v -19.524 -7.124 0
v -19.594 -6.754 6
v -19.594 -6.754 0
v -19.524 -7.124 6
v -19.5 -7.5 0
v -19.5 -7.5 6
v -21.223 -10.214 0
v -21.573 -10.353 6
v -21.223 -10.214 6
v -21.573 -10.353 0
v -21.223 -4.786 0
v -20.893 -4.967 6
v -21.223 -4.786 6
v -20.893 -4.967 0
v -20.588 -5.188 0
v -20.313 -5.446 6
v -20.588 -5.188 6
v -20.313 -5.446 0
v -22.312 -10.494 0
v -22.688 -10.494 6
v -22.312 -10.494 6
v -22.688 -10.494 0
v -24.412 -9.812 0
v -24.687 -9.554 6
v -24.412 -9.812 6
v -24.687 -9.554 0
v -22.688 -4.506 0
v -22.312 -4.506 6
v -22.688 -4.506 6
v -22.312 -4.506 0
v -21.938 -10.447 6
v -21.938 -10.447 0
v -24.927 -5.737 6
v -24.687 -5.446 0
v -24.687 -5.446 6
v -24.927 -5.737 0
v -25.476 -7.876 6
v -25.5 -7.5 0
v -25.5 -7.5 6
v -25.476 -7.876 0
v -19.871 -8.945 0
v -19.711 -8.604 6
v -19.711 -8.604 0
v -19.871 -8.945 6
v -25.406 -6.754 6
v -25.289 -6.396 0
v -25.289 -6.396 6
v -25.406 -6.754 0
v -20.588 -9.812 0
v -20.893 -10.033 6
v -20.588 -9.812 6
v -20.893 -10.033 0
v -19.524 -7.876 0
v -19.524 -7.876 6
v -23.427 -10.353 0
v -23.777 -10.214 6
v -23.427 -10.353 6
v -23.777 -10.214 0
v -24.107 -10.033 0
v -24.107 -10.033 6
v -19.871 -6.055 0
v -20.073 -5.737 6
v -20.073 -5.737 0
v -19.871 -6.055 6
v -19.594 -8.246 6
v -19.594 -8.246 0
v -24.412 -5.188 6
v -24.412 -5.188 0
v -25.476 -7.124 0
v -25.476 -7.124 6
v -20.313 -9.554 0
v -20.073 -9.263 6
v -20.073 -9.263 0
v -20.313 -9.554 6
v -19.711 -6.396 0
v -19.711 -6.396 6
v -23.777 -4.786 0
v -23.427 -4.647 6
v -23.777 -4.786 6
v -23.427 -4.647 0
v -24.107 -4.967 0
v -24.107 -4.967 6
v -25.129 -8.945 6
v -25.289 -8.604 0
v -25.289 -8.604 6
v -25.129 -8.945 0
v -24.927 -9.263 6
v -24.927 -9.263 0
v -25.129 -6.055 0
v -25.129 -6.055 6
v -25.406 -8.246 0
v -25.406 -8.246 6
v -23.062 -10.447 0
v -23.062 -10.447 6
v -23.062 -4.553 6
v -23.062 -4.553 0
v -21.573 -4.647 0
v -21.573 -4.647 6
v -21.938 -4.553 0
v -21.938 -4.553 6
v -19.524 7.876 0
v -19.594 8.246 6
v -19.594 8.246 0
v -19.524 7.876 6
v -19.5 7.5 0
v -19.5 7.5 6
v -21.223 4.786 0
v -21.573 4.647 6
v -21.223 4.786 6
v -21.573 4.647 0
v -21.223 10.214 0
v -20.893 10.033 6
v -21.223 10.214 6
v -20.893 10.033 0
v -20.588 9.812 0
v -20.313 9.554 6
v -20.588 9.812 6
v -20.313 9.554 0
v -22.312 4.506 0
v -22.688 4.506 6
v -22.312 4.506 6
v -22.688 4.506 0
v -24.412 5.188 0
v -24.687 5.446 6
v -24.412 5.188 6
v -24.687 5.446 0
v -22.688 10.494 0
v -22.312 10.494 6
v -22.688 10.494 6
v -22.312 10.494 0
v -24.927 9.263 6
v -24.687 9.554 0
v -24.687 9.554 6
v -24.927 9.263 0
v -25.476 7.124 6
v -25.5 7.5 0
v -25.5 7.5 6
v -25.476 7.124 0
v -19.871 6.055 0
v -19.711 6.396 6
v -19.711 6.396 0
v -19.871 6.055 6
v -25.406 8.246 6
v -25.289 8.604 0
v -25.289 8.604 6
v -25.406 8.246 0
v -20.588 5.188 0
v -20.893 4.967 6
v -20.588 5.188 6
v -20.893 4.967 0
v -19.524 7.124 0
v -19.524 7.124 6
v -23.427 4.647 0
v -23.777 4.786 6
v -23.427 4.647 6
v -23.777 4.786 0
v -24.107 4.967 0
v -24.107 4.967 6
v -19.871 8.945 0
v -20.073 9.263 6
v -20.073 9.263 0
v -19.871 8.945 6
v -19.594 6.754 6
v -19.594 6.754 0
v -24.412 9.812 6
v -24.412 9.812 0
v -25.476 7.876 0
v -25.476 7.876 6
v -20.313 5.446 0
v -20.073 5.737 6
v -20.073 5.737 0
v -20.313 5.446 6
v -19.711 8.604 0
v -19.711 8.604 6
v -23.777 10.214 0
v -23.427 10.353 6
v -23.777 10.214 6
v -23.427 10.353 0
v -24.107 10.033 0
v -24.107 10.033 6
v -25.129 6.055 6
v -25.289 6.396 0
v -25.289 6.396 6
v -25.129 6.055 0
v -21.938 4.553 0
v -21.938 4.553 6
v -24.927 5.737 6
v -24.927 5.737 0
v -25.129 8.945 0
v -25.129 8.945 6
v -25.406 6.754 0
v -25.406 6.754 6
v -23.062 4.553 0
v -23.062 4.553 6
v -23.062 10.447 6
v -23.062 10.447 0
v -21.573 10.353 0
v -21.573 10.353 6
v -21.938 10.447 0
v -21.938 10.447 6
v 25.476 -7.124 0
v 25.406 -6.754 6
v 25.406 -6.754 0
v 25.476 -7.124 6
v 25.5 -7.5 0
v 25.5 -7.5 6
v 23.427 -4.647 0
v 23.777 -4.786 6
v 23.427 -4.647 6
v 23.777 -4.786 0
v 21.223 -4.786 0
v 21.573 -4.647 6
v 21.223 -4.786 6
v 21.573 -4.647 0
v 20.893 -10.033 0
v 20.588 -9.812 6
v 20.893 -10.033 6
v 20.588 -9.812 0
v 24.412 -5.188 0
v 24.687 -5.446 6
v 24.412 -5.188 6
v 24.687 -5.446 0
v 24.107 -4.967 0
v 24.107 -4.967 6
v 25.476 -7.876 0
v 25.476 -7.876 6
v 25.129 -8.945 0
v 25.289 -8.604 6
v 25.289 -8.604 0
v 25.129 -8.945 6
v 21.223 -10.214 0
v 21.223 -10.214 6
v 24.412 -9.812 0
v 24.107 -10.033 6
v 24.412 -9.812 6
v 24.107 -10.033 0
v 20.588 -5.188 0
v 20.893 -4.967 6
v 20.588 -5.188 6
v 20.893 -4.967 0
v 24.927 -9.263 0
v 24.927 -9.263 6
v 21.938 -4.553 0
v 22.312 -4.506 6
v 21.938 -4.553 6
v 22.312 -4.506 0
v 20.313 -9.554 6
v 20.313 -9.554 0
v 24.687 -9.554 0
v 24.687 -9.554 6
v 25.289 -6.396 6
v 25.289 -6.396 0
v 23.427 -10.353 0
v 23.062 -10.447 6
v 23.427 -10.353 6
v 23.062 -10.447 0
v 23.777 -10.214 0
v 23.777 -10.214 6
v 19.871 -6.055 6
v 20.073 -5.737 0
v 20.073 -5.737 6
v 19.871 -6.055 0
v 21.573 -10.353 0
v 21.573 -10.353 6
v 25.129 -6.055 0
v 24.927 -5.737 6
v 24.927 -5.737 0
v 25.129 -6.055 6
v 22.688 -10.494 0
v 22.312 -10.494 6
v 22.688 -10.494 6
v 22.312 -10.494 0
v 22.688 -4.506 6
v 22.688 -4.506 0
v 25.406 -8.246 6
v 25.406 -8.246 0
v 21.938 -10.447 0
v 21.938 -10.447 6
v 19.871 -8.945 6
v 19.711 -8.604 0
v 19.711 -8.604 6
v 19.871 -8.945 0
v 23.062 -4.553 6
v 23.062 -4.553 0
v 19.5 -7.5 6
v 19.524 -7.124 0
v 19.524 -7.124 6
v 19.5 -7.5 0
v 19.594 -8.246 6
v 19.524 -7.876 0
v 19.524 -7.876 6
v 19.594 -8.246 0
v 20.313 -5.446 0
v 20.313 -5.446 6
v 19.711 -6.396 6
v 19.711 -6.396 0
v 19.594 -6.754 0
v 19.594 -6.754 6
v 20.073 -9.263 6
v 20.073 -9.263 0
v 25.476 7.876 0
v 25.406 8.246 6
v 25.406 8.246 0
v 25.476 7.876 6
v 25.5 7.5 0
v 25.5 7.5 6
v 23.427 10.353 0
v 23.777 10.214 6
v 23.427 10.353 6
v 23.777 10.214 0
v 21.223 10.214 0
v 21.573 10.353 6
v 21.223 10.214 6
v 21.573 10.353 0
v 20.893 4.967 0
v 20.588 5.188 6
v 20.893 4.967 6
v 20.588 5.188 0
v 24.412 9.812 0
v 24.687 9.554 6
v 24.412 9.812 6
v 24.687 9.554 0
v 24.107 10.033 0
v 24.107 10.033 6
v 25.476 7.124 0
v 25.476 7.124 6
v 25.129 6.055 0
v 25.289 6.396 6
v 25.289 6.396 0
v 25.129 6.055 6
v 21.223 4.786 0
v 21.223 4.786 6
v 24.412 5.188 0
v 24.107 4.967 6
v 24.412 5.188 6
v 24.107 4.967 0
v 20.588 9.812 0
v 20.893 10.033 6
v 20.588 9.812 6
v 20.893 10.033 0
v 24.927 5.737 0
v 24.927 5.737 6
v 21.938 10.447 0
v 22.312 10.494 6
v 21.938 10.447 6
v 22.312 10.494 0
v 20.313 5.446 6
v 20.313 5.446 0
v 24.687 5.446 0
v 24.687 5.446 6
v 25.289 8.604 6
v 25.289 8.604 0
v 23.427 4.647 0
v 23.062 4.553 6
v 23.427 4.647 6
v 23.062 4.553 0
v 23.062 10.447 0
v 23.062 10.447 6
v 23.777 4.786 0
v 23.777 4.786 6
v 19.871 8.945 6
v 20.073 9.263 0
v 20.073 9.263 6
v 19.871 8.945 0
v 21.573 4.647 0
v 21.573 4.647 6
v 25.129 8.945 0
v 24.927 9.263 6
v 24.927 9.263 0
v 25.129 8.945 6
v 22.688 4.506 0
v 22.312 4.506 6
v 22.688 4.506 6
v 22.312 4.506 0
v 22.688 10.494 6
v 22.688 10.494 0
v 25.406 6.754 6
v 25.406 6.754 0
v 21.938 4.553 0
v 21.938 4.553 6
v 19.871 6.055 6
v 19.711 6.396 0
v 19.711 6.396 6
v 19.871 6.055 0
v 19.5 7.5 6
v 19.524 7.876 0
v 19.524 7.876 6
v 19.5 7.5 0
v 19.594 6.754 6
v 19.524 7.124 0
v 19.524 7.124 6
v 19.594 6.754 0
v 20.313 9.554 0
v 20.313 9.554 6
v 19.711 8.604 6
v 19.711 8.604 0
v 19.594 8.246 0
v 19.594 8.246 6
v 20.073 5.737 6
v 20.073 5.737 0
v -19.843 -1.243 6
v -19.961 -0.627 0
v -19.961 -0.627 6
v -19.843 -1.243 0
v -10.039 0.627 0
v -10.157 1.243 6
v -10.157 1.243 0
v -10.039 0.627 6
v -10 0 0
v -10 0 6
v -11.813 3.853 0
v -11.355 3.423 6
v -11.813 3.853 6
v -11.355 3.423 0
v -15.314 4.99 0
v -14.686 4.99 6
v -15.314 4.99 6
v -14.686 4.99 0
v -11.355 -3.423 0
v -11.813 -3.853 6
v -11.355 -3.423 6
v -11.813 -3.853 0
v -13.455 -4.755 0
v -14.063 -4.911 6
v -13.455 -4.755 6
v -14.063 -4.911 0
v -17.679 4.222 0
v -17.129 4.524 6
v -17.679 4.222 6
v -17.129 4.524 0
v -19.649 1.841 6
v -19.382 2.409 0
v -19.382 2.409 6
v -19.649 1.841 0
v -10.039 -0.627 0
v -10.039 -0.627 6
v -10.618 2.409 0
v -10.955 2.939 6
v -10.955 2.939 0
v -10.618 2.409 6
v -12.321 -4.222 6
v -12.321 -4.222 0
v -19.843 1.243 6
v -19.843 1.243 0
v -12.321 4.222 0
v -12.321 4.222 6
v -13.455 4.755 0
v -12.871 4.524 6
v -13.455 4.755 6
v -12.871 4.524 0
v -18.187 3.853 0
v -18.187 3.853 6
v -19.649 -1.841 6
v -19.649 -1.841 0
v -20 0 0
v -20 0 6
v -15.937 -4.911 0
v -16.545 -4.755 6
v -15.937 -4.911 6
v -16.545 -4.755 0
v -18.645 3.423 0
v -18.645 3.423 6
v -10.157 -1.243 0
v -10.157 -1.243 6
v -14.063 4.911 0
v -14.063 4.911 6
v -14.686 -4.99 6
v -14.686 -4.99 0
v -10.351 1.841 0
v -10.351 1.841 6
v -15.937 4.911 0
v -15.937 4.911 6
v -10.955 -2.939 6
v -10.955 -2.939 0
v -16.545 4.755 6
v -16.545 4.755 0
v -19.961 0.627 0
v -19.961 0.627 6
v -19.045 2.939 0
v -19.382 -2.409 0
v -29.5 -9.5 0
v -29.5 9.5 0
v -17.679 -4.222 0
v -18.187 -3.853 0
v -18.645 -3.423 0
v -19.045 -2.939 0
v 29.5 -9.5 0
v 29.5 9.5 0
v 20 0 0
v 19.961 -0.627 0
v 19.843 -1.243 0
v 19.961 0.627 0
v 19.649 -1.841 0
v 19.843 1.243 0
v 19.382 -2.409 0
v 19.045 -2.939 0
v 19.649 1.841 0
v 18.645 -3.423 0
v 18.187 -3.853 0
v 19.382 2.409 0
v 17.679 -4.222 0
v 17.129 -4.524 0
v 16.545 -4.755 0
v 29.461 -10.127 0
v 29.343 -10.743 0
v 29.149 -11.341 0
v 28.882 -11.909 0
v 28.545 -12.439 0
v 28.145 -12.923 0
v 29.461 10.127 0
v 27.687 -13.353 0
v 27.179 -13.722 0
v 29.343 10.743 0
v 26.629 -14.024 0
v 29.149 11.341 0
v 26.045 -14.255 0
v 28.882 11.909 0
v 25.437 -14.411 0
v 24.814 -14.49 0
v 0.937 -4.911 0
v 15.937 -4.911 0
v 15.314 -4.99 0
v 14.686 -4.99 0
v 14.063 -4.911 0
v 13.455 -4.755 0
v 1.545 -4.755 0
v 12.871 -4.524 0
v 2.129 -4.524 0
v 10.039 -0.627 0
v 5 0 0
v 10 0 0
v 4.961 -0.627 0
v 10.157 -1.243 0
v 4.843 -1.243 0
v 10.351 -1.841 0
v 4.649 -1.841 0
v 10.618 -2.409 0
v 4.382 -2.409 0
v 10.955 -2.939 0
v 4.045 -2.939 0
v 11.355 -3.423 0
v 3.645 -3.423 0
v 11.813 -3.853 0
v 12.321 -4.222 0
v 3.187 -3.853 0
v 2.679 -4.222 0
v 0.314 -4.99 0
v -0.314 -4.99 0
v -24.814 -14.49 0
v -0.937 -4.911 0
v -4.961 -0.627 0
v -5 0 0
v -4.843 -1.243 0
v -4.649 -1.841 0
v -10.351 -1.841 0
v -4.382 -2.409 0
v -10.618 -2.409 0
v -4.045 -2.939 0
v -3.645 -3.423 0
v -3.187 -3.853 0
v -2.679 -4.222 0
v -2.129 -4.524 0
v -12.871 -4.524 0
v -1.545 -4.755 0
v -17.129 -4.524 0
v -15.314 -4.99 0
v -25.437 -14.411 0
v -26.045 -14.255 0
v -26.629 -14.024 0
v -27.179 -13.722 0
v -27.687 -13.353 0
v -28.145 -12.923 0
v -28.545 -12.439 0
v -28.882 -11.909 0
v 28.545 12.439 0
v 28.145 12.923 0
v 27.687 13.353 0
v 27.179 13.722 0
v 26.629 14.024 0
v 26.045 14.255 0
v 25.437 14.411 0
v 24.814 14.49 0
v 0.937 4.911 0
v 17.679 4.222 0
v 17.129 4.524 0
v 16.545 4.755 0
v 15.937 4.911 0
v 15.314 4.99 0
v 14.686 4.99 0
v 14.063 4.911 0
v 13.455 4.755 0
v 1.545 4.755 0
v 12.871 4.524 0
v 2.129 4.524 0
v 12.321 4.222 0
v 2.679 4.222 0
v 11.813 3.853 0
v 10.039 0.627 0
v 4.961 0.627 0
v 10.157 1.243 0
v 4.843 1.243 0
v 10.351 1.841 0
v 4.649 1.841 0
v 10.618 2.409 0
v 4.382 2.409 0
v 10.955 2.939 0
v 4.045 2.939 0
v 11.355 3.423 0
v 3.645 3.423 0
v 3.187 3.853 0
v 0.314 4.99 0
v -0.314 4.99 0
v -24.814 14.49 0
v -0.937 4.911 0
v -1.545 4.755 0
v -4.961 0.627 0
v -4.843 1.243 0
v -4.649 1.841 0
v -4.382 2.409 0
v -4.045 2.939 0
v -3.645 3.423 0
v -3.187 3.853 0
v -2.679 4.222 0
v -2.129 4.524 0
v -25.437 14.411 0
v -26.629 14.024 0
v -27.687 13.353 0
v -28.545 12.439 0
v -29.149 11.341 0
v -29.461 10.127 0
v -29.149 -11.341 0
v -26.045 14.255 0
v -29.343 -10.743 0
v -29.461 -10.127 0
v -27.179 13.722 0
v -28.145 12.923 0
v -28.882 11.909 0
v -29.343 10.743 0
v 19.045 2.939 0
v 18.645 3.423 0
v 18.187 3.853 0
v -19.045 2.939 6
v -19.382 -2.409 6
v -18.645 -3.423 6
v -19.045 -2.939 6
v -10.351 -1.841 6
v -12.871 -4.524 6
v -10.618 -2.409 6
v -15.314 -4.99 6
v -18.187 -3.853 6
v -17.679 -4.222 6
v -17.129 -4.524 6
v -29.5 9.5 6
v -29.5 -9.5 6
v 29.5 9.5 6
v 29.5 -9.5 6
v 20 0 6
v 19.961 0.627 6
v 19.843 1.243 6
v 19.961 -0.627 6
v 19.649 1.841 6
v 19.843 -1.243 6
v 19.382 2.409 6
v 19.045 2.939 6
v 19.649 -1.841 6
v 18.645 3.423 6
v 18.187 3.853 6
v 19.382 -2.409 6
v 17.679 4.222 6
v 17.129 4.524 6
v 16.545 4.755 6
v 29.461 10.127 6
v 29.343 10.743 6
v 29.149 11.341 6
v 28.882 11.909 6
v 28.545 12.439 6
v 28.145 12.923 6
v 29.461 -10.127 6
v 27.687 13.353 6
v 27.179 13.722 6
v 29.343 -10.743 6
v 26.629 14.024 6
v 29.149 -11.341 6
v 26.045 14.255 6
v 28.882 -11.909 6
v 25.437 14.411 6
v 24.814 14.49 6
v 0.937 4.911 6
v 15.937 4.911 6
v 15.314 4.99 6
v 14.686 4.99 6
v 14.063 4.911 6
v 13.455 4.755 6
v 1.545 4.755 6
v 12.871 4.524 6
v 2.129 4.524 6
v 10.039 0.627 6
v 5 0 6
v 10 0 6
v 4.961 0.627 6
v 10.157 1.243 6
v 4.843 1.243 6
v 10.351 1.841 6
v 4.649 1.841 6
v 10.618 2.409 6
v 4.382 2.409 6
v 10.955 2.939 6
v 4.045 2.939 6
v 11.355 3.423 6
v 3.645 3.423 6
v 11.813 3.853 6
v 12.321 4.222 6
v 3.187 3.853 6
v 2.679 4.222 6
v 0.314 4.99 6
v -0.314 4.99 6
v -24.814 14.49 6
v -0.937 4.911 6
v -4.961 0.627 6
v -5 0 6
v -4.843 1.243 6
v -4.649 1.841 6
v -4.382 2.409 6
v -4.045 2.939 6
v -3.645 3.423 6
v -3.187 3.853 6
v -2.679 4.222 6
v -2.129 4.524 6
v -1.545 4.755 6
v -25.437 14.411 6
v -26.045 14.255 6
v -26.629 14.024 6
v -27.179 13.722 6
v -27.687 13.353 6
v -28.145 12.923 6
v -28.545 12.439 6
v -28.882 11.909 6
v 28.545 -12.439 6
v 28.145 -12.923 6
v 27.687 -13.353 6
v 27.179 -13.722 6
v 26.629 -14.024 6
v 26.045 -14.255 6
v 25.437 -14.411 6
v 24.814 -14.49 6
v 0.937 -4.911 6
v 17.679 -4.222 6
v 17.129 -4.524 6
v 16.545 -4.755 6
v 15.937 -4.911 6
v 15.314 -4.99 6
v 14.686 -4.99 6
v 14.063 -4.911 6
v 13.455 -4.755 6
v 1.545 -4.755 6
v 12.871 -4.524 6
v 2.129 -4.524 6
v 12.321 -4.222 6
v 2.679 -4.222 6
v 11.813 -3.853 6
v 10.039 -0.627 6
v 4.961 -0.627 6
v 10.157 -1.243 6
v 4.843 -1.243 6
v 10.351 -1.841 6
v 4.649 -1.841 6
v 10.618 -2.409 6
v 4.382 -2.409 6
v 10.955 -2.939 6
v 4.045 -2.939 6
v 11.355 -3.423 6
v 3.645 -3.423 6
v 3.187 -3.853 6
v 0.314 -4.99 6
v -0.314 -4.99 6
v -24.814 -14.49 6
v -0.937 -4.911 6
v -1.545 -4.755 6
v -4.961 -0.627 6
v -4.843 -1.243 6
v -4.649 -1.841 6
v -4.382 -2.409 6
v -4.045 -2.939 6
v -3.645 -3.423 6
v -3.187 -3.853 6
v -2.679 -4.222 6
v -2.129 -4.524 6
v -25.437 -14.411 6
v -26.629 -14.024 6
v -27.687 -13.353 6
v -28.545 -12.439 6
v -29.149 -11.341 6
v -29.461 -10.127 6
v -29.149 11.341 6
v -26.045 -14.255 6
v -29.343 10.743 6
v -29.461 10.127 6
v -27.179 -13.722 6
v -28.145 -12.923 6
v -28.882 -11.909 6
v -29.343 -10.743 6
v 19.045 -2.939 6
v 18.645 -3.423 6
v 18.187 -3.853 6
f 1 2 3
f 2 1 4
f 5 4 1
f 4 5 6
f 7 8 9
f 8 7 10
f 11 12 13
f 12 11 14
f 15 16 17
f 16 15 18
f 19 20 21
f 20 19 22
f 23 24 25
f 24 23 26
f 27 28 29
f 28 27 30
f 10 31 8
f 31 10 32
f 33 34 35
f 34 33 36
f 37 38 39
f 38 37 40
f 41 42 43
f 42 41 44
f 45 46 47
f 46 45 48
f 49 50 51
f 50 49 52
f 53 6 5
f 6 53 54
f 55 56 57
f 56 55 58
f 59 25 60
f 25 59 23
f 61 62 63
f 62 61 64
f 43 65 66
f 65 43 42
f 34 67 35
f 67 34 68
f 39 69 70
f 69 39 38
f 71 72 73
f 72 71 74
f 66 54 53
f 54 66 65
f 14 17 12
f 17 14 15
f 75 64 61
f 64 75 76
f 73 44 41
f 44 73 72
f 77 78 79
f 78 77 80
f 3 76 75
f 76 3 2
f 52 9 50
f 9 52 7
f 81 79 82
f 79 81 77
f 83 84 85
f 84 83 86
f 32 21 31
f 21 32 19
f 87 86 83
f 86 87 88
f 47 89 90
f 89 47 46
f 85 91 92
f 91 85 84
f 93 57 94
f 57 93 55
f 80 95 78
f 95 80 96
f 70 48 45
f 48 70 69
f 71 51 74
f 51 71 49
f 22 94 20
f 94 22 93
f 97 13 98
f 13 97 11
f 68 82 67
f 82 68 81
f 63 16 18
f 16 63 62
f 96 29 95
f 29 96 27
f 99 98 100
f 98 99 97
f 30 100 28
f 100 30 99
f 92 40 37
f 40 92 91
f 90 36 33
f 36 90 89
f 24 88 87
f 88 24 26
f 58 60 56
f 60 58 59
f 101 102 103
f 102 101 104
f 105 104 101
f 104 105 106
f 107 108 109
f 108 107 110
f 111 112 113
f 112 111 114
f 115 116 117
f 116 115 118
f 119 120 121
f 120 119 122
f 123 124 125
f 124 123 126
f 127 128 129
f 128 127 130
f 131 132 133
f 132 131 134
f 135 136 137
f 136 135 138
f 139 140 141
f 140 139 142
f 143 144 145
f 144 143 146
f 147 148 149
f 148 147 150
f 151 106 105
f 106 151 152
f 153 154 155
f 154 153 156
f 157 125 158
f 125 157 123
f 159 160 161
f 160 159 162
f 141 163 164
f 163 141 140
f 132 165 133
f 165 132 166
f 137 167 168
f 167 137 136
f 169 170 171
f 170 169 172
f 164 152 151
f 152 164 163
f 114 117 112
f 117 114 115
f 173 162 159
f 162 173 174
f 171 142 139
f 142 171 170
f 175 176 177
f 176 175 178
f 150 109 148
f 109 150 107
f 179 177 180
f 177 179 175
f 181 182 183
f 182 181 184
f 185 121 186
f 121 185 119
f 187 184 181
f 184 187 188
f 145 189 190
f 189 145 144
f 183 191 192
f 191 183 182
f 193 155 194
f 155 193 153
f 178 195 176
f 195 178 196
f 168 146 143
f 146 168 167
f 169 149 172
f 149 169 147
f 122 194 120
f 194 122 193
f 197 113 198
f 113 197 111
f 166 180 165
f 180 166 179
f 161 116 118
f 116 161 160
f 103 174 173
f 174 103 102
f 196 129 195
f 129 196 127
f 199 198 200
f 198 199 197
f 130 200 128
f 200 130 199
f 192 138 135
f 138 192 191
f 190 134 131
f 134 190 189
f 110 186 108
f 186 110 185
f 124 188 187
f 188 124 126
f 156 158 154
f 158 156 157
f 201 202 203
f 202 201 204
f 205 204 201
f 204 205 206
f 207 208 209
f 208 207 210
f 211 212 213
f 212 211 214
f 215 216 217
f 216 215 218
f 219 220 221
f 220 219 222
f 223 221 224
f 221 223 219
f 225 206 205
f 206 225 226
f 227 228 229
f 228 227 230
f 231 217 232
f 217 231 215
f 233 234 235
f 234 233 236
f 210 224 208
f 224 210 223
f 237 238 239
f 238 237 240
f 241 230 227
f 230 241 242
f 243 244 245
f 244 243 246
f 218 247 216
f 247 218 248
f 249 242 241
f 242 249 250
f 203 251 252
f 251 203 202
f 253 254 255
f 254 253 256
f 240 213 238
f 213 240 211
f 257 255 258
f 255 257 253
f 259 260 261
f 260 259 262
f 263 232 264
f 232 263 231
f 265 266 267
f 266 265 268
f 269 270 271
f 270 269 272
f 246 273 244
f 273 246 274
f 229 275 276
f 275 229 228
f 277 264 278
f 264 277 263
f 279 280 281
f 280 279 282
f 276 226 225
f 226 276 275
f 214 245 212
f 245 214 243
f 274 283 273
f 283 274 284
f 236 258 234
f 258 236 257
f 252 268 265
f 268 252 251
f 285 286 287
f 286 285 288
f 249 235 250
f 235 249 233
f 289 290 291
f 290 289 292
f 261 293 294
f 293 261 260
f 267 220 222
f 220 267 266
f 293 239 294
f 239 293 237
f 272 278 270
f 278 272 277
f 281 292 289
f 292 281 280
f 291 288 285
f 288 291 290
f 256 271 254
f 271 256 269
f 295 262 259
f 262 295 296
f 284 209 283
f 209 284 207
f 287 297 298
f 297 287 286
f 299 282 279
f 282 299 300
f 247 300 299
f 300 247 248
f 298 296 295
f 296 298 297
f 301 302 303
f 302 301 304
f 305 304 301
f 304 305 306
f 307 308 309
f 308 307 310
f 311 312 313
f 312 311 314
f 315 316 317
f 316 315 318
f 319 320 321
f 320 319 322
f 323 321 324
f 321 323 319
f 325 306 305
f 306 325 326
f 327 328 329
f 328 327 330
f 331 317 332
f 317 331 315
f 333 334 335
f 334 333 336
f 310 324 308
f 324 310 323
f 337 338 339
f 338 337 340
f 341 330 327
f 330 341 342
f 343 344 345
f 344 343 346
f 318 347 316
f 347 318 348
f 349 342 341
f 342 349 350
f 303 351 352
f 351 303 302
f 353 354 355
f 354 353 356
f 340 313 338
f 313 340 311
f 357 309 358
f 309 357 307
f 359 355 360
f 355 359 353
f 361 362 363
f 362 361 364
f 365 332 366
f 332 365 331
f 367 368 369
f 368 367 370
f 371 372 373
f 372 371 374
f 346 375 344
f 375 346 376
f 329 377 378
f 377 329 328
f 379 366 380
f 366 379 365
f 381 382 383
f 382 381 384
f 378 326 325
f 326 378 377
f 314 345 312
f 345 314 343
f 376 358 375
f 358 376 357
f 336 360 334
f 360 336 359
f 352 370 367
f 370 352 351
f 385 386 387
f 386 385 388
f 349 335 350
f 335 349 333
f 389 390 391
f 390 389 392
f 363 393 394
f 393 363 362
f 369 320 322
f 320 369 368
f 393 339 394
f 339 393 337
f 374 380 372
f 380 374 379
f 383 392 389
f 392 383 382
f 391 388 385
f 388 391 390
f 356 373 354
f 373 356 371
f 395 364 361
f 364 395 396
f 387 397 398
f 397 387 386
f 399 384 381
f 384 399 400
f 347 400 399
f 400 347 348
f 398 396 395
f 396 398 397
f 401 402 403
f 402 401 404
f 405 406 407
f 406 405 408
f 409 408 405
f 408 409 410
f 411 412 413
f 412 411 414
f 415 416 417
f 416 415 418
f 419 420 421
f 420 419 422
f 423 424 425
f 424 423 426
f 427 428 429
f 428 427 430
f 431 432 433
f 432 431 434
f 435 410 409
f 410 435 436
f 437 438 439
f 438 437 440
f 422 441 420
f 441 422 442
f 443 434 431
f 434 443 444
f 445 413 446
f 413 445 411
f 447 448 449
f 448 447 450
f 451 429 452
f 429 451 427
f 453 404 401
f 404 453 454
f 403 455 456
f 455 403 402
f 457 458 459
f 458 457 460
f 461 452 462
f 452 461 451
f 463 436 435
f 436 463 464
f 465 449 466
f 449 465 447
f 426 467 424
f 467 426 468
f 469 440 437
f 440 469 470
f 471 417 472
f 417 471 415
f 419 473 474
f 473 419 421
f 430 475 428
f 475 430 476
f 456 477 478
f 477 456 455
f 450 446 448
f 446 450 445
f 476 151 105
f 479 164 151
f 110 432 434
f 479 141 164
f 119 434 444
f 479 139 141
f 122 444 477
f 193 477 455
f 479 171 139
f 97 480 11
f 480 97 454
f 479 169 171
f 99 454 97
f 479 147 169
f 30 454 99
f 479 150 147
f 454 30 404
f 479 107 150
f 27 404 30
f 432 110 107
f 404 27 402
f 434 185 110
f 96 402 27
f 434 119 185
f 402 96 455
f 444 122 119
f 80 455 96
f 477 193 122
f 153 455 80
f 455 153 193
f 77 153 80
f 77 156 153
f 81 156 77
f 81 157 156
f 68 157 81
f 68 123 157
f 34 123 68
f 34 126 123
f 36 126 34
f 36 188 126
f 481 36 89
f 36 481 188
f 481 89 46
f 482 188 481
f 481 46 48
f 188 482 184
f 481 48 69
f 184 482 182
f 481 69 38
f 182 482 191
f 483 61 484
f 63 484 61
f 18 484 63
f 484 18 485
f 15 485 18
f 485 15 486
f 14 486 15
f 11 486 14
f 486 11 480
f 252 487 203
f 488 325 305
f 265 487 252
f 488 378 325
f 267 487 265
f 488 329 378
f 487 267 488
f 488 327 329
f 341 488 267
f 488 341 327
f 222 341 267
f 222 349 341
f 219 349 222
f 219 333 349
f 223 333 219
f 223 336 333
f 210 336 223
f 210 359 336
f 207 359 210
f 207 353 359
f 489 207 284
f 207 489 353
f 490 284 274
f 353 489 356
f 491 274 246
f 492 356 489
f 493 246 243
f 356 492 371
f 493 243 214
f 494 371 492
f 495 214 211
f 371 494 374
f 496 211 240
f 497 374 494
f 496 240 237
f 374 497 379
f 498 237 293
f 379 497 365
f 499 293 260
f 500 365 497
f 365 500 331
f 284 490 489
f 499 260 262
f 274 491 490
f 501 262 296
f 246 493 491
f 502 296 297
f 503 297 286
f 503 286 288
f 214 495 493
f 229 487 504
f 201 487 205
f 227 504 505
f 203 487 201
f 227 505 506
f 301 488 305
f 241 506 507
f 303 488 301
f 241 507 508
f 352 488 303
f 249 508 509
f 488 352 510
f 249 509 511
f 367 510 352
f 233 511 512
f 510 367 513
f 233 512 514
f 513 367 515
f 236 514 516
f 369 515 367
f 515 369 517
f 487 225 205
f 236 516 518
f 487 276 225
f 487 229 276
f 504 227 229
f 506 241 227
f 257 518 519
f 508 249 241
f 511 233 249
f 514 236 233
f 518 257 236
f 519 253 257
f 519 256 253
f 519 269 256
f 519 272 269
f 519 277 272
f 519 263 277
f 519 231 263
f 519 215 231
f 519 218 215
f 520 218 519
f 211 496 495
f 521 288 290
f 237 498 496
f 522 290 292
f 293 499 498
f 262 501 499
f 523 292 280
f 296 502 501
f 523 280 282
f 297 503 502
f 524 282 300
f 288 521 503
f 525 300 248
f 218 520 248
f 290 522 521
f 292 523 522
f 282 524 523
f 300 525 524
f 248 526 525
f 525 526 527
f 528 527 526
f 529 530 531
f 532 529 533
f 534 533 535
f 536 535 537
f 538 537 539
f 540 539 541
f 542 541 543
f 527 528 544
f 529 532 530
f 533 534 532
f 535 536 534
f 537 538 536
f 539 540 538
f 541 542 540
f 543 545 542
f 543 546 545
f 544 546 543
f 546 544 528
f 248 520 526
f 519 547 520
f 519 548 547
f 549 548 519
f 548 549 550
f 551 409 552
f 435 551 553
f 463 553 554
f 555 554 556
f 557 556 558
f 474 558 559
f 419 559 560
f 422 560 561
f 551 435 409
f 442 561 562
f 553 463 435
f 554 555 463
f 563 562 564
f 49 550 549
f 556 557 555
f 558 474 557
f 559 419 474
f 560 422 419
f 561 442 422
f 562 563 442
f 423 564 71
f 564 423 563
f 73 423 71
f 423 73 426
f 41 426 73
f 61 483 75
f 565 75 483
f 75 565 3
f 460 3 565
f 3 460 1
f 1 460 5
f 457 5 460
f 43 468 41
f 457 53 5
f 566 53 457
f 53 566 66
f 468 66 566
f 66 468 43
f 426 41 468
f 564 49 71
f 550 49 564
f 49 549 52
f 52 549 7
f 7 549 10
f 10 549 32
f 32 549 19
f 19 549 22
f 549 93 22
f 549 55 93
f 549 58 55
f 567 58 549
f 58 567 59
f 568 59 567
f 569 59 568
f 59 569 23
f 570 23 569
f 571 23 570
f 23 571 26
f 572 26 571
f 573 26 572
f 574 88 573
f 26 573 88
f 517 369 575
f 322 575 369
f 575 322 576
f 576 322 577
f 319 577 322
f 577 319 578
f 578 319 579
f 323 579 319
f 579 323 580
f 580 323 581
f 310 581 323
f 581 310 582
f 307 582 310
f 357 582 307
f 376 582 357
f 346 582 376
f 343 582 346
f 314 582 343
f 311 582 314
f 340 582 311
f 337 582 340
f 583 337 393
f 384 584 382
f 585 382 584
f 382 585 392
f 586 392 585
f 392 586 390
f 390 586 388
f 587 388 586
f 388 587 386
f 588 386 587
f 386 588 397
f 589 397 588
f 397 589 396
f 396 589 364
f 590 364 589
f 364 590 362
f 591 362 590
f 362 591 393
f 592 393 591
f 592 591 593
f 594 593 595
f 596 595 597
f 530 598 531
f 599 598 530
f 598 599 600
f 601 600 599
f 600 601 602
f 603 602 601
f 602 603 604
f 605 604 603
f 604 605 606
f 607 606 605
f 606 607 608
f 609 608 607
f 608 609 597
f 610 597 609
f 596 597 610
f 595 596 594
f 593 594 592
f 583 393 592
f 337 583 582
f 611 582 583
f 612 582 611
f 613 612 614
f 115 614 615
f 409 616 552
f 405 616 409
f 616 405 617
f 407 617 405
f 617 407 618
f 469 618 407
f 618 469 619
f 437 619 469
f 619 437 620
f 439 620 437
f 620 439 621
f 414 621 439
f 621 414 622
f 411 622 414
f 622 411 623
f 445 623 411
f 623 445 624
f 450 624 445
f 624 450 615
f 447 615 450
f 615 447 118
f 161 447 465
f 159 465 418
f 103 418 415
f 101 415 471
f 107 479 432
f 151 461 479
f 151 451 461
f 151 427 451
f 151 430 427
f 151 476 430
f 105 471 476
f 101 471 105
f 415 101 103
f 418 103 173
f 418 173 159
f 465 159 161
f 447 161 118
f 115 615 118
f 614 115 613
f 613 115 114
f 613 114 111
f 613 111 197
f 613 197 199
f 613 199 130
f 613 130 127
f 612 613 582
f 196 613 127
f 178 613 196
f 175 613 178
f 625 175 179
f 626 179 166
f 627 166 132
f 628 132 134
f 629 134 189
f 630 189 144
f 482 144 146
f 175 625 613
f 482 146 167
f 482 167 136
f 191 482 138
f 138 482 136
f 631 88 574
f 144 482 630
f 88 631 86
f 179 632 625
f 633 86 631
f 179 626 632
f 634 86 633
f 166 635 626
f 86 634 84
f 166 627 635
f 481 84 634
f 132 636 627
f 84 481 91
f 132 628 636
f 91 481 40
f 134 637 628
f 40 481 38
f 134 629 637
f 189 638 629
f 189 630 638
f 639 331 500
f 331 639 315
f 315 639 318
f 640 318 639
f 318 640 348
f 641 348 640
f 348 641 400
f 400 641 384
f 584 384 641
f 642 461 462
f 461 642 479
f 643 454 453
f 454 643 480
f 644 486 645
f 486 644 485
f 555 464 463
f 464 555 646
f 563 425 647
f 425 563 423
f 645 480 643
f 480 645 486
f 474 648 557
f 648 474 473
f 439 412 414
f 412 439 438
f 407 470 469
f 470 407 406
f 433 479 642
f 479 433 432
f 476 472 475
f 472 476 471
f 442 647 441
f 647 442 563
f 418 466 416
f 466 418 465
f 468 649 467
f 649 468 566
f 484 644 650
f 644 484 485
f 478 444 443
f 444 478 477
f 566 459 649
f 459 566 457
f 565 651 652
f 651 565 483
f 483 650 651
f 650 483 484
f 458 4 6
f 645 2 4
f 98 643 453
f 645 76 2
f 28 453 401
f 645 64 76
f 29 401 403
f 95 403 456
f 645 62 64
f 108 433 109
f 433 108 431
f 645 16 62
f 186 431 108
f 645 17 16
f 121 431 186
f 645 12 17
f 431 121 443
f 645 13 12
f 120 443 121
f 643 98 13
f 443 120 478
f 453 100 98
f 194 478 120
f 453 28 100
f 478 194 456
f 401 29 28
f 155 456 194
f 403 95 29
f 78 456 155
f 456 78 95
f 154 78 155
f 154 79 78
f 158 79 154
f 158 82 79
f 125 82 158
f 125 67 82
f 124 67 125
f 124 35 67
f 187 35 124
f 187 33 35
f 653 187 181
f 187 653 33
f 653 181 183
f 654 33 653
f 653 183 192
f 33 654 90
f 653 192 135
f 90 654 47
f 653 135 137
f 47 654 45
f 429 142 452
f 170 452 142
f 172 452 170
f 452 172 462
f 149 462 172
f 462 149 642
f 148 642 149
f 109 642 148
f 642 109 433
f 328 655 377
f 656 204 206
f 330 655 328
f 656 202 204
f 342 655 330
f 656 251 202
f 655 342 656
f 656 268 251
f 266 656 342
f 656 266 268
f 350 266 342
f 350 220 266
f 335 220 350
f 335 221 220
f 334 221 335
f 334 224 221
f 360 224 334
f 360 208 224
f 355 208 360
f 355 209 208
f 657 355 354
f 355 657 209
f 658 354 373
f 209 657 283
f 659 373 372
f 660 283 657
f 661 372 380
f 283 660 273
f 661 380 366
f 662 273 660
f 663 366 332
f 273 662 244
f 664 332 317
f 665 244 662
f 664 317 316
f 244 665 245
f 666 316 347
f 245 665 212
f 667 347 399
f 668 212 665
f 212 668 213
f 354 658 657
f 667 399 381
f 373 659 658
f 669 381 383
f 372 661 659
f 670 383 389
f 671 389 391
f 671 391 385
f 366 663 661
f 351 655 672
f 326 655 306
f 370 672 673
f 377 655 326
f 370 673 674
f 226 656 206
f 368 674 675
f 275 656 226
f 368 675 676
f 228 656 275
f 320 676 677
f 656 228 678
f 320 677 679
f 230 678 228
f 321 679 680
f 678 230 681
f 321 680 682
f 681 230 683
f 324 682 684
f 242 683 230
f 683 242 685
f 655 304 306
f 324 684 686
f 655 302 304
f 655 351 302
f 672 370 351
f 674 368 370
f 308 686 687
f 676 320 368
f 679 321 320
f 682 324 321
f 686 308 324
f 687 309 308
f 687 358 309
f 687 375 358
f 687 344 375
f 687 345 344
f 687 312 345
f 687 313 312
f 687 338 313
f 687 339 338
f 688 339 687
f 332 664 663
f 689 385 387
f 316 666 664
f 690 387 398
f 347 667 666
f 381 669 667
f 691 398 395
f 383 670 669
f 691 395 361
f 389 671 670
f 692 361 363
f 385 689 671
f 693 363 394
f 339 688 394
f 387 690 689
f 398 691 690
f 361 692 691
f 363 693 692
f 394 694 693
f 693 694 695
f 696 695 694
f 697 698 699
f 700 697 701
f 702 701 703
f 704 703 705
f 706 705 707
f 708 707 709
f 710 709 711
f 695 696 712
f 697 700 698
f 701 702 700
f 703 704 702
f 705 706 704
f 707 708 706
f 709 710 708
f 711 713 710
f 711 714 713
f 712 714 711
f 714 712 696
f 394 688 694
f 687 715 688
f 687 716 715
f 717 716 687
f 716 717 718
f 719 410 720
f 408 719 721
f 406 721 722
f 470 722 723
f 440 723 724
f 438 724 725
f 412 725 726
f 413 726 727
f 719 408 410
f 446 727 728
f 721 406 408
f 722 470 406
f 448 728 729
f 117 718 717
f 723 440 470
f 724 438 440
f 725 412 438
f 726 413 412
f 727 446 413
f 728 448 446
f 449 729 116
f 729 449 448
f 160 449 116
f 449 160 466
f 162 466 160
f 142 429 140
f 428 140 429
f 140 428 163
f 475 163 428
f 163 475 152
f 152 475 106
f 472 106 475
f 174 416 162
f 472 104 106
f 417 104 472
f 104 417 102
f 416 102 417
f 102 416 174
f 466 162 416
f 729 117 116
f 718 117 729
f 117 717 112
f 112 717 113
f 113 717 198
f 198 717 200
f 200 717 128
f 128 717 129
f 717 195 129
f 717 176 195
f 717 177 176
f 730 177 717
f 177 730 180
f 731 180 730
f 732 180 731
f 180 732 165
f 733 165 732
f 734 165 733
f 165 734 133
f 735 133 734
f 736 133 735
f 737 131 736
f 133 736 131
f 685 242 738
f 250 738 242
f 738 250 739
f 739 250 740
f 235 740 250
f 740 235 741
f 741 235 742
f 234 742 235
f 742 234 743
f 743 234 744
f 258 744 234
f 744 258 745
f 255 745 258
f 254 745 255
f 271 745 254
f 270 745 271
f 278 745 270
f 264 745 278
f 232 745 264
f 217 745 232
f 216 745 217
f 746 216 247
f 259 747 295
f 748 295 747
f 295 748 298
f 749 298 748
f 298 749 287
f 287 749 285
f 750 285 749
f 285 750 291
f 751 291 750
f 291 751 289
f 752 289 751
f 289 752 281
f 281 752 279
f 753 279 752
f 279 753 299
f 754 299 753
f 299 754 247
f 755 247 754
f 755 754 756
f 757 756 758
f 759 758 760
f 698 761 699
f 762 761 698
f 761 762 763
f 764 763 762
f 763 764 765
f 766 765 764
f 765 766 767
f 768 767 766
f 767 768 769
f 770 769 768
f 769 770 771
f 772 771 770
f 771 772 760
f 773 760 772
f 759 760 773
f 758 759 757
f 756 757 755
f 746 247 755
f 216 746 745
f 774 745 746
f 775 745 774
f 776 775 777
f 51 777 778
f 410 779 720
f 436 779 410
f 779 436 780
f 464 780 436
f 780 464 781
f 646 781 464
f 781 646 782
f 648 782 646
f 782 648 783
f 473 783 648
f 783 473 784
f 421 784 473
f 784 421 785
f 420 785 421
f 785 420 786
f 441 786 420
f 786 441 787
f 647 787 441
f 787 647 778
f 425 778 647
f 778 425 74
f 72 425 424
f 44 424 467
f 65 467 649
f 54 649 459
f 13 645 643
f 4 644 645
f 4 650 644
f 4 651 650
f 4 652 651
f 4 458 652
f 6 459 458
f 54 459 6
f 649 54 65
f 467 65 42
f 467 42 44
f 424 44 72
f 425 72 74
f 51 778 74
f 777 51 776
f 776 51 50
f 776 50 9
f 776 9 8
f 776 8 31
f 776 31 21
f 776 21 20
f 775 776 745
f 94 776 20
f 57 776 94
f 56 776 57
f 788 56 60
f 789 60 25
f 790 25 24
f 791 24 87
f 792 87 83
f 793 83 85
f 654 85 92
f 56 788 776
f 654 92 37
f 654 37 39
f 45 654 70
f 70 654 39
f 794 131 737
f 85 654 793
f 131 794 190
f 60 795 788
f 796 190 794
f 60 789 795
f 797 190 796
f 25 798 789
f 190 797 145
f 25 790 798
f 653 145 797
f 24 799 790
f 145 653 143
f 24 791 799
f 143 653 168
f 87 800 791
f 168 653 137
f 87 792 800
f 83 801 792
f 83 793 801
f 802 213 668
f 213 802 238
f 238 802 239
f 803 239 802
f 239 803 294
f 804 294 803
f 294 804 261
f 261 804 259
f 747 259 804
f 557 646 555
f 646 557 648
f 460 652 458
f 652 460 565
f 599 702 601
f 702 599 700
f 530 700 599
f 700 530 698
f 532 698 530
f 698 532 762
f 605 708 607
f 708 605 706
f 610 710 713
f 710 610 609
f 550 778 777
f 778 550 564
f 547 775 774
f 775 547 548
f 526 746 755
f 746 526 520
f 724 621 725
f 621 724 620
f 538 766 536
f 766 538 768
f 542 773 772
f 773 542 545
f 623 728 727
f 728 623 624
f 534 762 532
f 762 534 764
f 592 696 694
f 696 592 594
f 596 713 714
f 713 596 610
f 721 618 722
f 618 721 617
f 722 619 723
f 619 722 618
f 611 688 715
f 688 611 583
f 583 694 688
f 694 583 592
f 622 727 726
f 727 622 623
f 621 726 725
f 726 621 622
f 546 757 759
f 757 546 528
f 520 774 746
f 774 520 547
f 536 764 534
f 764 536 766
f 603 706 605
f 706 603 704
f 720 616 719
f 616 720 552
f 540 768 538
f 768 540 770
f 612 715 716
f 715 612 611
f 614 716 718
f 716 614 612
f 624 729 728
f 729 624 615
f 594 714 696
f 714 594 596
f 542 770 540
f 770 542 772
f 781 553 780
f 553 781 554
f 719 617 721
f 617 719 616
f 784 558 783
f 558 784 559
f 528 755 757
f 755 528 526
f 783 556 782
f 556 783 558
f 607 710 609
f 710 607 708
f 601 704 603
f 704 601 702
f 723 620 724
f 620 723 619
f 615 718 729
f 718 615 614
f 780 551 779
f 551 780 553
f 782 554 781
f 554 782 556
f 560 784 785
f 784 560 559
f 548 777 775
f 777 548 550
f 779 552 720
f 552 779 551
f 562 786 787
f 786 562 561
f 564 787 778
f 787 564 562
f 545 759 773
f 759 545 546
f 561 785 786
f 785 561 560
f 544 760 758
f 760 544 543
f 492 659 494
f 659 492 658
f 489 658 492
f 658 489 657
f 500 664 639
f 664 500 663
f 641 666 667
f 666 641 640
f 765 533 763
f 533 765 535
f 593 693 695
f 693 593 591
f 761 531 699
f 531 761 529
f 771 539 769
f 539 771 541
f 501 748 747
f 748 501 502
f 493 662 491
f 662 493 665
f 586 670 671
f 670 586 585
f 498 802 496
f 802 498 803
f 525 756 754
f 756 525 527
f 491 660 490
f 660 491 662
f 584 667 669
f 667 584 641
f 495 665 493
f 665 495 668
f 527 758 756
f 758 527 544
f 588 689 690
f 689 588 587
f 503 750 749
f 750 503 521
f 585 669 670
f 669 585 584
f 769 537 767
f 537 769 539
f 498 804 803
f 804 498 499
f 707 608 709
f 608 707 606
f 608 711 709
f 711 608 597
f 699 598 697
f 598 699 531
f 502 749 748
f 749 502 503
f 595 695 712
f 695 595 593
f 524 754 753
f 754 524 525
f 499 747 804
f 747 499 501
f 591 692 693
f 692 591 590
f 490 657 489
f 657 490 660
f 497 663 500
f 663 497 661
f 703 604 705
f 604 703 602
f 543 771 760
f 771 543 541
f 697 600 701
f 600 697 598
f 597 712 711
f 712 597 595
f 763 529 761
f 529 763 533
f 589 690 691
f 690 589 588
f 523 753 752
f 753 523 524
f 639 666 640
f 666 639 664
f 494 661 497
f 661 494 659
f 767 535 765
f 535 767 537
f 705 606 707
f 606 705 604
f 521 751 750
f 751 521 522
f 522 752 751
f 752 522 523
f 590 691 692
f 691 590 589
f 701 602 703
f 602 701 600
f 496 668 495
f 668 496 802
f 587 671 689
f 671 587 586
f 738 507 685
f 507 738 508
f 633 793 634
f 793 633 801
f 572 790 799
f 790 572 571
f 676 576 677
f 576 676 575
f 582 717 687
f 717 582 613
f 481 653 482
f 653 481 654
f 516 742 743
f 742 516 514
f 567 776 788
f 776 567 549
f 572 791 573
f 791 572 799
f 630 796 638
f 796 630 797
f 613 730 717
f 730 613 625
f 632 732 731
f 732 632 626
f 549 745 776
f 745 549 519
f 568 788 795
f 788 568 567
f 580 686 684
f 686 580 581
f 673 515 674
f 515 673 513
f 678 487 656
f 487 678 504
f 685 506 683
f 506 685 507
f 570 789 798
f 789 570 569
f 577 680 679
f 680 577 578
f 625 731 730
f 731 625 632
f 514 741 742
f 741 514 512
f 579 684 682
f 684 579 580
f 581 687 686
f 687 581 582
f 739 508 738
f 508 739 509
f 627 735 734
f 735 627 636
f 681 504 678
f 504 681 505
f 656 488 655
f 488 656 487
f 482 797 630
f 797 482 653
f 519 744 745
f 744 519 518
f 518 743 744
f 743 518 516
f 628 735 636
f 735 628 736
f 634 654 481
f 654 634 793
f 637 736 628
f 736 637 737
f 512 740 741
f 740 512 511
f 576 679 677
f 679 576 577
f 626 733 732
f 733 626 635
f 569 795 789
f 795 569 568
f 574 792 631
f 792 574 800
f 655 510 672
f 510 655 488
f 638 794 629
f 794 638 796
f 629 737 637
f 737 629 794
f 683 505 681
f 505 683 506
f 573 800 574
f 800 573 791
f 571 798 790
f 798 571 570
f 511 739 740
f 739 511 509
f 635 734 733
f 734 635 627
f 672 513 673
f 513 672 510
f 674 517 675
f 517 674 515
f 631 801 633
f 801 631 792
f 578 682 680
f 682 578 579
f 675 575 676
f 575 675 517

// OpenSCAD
$fn = 50;


difference() {
	union() {
		hull() {
			translate(v = [-24.5000000000, 9.5000000000, 0]) {
				cylinder(h = 6, r = 5);
			}
			translate(v = [24.5000000000, 9.5000000000, 0]) {
				cylinder(h = 6, r = 5);
			}
			translate(v = [-24.5000000000, -9.5000000000, 0]) {
				cylinder(h = 6, r = 5);
			}
			translate(v = [24.5000000000, -9.5000000000, 0]) {
				cylinder(h = 6, r = 5);
			}
		}
	}
	union() {
		#translate(v = [-22.5000000000, -7.5000000000, -100.0000000000]) {
			cylinder(h = 200, r = 3.0000000000);
		}
		#translate(v = [-22.5000000000, 7.5000000000, -100.0000000000]) {
			cylinder(h = 200, r = 3.0000000000);
		}
		#translate(v = [22.5000000000, -7.5000000000, -100.0000000000]) {
			cylinder(h = 200, r = 3.0000000000);
		}
		#translate(v = [22.5000000000, 7.5000000000, -100.0000000000]) {
			cylinder(h = 200, r = 3.0000000000);
		}
		#translate(v = [-15.0000000000, 0, 0]) {
			cylinder(h = 6, r = 5.0000000000);
		}
		#cylinder(h = 6, r = 5.0000000000);
		#translate(v = [15.0000000000, 0, 0]) {
			cylinder(h = 6, r = 5.0000000000);
		}
	}
}
